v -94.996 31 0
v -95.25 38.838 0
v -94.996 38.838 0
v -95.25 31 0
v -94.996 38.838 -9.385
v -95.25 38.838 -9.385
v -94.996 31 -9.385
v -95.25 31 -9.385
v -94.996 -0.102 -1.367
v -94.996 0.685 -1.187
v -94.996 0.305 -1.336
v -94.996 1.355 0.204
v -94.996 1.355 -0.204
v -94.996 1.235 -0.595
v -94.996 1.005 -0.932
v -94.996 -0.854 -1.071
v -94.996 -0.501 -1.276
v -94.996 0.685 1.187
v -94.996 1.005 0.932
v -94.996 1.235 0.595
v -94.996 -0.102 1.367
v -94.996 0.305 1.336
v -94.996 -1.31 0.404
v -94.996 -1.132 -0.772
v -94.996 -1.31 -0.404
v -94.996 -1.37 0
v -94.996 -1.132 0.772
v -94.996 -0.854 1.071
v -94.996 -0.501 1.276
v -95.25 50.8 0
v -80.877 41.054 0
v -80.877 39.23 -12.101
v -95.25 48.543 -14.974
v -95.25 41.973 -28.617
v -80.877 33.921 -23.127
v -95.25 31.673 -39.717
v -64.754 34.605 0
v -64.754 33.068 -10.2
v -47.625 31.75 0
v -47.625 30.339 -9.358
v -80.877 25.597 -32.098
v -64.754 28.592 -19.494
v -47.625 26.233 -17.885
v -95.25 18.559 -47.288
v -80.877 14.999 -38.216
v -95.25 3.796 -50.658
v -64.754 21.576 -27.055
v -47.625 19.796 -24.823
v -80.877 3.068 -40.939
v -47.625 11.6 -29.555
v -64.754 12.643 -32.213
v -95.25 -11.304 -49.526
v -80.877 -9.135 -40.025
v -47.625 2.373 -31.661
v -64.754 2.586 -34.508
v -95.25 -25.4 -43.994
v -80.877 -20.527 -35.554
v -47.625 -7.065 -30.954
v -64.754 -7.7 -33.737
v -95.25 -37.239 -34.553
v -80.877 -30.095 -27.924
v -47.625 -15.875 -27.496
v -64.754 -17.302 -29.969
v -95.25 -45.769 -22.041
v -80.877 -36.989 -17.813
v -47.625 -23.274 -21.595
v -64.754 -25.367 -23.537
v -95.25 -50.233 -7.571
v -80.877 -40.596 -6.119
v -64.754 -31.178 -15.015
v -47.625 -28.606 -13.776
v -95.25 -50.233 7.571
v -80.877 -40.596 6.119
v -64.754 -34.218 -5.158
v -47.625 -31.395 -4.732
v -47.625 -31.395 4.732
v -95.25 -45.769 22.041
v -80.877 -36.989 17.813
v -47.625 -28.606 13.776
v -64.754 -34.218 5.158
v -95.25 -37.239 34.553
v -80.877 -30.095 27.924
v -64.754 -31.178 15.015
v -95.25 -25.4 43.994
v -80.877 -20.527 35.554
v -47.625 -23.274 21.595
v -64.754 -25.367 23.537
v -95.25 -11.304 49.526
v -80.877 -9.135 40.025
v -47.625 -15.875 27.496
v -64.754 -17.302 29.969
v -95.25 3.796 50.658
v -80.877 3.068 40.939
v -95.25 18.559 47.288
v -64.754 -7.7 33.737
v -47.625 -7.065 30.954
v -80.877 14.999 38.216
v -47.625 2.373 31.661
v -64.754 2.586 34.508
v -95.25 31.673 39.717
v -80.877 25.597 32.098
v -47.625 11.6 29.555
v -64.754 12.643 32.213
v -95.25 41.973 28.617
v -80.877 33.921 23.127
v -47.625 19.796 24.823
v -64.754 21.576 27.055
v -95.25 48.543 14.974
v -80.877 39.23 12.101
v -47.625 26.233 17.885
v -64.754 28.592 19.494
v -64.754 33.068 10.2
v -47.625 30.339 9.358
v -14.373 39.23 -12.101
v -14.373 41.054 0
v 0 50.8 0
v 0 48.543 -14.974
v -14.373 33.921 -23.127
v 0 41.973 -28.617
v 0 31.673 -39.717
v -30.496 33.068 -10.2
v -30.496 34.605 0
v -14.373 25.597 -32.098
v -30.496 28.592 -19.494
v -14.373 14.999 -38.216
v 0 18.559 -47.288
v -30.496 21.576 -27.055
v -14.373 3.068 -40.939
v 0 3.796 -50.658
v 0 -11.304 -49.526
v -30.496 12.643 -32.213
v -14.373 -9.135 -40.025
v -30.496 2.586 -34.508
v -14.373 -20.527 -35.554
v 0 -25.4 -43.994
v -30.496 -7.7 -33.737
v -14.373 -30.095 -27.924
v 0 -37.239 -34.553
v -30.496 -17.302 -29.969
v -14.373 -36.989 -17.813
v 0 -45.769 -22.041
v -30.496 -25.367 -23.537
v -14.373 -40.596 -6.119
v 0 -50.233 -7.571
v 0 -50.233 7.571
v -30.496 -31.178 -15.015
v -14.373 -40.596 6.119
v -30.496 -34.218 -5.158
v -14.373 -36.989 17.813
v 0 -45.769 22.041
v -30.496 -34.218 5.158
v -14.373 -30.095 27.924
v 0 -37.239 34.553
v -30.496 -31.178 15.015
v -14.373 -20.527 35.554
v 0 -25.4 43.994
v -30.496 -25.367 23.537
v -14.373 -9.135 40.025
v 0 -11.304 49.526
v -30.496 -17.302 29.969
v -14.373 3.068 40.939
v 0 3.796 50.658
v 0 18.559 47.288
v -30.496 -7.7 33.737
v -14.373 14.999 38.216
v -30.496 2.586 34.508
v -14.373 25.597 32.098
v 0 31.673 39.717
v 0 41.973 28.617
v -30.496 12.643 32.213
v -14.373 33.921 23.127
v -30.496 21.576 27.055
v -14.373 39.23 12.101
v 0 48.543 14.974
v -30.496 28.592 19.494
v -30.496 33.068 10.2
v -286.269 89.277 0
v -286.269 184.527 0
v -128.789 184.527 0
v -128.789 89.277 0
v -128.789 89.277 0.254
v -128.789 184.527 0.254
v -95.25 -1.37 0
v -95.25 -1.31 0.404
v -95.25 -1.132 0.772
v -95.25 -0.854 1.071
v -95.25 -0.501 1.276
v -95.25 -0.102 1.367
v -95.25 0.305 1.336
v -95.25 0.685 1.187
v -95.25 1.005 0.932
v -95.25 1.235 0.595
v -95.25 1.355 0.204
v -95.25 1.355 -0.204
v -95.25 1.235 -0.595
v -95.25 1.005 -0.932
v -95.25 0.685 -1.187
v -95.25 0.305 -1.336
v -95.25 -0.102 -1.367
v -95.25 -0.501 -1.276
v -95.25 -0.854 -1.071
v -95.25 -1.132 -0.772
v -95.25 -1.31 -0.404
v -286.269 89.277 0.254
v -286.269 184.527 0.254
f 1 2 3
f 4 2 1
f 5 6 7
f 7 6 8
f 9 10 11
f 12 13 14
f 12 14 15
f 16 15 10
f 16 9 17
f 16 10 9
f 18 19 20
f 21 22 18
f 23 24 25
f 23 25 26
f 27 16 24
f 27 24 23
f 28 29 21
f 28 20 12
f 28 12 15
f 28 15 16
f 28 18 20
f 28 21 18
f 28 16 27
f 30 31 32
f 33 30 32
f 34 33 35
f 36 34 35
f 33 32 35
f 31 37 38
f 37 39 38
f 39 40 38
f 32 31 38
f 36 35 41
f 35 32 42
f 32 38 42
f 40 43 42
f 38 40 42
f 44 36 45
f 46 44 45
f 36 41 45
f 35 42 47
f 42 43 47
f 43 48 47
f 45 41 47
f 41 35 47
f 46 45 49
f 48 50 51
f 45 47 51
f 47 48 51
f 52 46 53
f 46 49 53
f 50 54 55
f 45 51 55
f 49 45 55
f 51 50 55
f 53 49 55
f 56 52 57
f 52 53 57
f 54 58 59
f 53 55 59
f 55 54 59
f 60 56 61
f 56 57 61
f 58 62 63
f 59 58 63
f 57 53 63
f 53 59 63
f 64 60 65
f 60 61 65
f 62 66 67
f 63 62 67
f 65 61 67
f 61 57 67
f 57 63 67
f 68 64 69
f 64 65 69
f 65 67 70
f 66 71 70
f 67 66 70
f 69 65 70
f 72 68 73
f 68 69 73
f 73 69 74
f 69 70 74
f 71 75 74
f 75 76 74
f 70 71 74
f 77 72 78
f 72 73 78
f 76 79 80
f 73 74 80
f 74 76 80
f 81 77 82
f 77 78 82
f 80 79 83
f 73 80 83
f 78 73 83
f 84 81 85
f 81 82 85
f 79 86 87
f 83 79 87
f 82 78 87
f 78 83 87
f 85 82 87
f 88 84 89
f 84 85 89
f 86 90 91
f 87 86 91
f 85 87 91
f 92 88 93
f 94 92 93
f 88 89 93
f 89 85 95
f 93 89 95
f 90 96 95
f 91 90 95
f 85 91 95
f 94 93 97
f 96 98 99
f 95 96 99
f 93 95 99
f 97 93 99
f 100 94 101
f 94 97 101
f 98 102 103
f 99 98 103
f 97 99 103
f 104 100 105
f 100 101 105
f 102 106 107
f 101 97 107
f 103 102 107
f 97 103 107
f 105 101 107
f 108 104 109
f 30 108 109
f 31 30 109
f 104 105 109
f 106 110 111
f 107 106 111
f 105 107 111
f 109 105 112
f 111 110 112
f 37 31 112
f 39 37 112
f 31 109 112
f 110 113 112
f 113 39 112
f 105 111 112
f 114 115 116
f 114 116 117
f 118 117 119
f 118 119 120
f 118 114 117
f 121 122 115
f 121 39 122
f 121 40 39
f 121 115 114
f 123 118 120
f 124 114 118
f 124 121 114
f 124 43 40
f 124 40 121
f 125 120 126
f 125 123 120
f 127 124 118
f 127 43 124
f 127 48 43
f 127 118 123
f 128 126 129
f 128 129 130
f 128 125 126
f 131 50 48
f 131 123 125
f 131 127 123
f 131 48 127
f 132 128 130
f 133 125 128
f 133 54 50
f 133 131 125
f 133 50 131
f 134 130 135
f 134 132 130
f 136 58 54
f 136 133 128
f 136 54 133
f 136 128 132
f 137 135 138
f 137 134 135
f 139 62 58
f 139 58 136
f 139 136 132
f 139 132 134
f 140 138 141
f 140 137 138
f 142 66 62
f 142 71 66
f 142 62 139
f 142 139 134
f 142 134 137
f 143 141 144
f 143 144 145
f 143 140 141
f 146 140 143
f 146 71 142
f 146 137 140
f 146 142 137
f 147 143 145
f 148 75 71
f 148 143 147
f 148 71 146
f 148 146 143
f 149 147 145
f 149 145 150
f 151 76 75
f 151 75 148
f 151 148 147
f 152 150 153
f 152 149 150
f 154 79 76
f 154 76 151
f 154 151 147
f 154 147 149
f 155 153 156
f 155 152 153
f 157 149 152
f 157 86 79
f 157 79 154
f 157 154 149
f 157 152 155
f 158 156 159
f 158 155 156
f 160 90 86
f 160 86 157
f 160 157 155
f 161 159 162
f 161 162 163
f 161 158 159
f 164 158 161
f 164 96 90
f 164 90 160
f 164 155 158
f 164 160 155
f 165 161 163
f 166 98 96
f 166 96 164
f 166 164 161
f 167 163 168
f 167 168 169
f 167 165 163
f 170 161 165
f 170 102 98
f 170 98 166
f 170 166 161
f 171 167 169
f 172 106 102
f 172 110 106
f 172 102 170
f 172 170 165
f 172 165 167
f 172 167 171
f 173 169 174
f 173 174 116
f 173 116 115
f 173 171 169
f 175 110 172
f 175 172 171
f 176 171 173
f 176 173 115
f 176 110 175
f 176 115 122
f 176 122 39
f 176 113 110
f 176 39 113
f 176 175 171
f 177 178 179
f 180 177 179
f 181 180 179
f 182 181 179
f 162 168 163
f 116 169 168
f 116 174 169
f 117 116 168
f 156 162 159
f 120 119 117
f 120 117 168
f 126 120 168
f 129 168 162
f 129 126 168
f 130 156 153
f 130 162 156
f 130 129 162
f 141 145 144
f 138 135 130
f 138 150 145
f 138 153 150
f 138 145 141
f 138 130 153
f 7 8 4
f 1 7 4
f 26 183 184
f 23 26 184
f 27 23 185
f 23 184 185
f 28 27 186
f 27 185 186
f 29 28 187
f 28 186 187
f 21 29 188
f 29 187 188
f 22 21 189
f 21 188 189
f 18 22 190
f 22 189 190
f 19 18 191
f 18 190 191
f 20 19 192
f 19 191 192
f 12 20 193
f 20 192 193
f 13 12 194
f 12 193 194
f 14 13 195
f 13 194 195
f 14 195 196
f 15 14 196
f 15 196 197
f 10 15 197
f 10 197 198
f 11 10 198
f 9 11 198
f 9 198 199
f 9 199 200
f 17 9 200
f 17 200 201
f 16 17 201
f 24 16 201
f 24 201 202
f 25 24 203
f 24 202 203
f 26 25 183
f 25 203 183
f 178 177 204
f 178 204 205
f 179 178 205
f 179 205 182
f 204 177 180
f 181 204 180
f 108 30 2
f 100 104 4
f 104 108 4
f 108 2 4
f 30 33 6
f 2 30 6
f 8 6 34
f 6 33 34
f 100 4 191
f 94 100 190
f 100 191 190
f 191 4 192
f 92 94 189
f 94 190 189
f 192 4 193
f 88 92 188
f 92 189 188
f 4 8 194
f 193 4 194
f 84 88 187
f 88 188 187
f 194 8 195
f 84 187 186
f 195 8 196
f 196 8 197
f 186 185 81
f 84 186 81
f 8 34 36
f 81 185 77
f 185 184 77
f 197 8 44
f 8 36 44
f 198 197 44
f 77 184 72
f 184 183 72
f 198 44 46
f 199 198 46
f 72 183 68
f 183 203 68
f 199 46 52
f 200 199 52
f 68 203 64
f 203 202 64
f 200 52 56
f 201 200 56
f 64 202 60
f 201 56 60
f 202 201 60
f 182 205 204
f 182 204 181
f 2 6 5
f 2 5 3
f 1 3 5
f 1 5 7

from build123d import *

# Parameters (mm, degrees)
F3_W     = 7.837419
F3_H     = 9.385435
F4_DEPTH = 0.254
F5_R     = 1.370395
F6_DEPTH = 0.254
F7_W     = 157.48
F7_H     = 95.25
F8_DEPTH = 0.254


with BuildPart() as f1:
    # F0 (on Top) → F1 (revolve)
    with BuildSketch(Plane.XY):
        with BuildLine():
            Line((-47.625, 0), (0, 0))
            Line((0, 0), (0, 50.8))
            ThreePointArc((0, 50.8), (-22.260562, 37.395156), (-47.625, 31.75))
            Line((-47.625, 31.75), (-47.625, 0))
        make_face()
    revolve(axis=Axis((-23.8125, 0, 0), (-1, 0, 0)))

    # F2: F1 across face


with BuildPart() as f1_1:
    add(f1.part)
    add(f1.part.mirror(Plane(origin=(-47.625, 0, 0), x_dir=(0, -1, 0), z_dir=(-1, 0, 0))))

    # F3 (on face) → F4 (cut)
    with BuildSketch(Plane(origin=(-95.25, 0, 0), x_dir=(0, -1, 0), z_dir=(-1, 0, 0))):
        with Locations((-34.919129, -4.692717)):
            Rectangle(F3_W, F3_H)
    extrude(amount=-F4_DEPTH, mode=Mode.SUBTRACT)

    # F5 (on face) → F6 (cut)
    with BuildSketch(Plane(origin=(-95.25, 0, 0), x_dir=(0, -1, 0), z_dir=(-1, 0, 0))):
        Circle(F5_R)
    extrude(amount=-F6_DEPTH, mode=Mode.SUBTRACT)


with BuildPart() as f8:
    # F7 (on Top) → F8 (new body)
    with BuildSketch(Plane.XY):
        with Locations((-207.528638, 136.902407)):
            Rectangle(F7_W, F7_H)
    extrude(amount=F8_DEPTH)


solid = Compound([f1_1.part, f8.part])
